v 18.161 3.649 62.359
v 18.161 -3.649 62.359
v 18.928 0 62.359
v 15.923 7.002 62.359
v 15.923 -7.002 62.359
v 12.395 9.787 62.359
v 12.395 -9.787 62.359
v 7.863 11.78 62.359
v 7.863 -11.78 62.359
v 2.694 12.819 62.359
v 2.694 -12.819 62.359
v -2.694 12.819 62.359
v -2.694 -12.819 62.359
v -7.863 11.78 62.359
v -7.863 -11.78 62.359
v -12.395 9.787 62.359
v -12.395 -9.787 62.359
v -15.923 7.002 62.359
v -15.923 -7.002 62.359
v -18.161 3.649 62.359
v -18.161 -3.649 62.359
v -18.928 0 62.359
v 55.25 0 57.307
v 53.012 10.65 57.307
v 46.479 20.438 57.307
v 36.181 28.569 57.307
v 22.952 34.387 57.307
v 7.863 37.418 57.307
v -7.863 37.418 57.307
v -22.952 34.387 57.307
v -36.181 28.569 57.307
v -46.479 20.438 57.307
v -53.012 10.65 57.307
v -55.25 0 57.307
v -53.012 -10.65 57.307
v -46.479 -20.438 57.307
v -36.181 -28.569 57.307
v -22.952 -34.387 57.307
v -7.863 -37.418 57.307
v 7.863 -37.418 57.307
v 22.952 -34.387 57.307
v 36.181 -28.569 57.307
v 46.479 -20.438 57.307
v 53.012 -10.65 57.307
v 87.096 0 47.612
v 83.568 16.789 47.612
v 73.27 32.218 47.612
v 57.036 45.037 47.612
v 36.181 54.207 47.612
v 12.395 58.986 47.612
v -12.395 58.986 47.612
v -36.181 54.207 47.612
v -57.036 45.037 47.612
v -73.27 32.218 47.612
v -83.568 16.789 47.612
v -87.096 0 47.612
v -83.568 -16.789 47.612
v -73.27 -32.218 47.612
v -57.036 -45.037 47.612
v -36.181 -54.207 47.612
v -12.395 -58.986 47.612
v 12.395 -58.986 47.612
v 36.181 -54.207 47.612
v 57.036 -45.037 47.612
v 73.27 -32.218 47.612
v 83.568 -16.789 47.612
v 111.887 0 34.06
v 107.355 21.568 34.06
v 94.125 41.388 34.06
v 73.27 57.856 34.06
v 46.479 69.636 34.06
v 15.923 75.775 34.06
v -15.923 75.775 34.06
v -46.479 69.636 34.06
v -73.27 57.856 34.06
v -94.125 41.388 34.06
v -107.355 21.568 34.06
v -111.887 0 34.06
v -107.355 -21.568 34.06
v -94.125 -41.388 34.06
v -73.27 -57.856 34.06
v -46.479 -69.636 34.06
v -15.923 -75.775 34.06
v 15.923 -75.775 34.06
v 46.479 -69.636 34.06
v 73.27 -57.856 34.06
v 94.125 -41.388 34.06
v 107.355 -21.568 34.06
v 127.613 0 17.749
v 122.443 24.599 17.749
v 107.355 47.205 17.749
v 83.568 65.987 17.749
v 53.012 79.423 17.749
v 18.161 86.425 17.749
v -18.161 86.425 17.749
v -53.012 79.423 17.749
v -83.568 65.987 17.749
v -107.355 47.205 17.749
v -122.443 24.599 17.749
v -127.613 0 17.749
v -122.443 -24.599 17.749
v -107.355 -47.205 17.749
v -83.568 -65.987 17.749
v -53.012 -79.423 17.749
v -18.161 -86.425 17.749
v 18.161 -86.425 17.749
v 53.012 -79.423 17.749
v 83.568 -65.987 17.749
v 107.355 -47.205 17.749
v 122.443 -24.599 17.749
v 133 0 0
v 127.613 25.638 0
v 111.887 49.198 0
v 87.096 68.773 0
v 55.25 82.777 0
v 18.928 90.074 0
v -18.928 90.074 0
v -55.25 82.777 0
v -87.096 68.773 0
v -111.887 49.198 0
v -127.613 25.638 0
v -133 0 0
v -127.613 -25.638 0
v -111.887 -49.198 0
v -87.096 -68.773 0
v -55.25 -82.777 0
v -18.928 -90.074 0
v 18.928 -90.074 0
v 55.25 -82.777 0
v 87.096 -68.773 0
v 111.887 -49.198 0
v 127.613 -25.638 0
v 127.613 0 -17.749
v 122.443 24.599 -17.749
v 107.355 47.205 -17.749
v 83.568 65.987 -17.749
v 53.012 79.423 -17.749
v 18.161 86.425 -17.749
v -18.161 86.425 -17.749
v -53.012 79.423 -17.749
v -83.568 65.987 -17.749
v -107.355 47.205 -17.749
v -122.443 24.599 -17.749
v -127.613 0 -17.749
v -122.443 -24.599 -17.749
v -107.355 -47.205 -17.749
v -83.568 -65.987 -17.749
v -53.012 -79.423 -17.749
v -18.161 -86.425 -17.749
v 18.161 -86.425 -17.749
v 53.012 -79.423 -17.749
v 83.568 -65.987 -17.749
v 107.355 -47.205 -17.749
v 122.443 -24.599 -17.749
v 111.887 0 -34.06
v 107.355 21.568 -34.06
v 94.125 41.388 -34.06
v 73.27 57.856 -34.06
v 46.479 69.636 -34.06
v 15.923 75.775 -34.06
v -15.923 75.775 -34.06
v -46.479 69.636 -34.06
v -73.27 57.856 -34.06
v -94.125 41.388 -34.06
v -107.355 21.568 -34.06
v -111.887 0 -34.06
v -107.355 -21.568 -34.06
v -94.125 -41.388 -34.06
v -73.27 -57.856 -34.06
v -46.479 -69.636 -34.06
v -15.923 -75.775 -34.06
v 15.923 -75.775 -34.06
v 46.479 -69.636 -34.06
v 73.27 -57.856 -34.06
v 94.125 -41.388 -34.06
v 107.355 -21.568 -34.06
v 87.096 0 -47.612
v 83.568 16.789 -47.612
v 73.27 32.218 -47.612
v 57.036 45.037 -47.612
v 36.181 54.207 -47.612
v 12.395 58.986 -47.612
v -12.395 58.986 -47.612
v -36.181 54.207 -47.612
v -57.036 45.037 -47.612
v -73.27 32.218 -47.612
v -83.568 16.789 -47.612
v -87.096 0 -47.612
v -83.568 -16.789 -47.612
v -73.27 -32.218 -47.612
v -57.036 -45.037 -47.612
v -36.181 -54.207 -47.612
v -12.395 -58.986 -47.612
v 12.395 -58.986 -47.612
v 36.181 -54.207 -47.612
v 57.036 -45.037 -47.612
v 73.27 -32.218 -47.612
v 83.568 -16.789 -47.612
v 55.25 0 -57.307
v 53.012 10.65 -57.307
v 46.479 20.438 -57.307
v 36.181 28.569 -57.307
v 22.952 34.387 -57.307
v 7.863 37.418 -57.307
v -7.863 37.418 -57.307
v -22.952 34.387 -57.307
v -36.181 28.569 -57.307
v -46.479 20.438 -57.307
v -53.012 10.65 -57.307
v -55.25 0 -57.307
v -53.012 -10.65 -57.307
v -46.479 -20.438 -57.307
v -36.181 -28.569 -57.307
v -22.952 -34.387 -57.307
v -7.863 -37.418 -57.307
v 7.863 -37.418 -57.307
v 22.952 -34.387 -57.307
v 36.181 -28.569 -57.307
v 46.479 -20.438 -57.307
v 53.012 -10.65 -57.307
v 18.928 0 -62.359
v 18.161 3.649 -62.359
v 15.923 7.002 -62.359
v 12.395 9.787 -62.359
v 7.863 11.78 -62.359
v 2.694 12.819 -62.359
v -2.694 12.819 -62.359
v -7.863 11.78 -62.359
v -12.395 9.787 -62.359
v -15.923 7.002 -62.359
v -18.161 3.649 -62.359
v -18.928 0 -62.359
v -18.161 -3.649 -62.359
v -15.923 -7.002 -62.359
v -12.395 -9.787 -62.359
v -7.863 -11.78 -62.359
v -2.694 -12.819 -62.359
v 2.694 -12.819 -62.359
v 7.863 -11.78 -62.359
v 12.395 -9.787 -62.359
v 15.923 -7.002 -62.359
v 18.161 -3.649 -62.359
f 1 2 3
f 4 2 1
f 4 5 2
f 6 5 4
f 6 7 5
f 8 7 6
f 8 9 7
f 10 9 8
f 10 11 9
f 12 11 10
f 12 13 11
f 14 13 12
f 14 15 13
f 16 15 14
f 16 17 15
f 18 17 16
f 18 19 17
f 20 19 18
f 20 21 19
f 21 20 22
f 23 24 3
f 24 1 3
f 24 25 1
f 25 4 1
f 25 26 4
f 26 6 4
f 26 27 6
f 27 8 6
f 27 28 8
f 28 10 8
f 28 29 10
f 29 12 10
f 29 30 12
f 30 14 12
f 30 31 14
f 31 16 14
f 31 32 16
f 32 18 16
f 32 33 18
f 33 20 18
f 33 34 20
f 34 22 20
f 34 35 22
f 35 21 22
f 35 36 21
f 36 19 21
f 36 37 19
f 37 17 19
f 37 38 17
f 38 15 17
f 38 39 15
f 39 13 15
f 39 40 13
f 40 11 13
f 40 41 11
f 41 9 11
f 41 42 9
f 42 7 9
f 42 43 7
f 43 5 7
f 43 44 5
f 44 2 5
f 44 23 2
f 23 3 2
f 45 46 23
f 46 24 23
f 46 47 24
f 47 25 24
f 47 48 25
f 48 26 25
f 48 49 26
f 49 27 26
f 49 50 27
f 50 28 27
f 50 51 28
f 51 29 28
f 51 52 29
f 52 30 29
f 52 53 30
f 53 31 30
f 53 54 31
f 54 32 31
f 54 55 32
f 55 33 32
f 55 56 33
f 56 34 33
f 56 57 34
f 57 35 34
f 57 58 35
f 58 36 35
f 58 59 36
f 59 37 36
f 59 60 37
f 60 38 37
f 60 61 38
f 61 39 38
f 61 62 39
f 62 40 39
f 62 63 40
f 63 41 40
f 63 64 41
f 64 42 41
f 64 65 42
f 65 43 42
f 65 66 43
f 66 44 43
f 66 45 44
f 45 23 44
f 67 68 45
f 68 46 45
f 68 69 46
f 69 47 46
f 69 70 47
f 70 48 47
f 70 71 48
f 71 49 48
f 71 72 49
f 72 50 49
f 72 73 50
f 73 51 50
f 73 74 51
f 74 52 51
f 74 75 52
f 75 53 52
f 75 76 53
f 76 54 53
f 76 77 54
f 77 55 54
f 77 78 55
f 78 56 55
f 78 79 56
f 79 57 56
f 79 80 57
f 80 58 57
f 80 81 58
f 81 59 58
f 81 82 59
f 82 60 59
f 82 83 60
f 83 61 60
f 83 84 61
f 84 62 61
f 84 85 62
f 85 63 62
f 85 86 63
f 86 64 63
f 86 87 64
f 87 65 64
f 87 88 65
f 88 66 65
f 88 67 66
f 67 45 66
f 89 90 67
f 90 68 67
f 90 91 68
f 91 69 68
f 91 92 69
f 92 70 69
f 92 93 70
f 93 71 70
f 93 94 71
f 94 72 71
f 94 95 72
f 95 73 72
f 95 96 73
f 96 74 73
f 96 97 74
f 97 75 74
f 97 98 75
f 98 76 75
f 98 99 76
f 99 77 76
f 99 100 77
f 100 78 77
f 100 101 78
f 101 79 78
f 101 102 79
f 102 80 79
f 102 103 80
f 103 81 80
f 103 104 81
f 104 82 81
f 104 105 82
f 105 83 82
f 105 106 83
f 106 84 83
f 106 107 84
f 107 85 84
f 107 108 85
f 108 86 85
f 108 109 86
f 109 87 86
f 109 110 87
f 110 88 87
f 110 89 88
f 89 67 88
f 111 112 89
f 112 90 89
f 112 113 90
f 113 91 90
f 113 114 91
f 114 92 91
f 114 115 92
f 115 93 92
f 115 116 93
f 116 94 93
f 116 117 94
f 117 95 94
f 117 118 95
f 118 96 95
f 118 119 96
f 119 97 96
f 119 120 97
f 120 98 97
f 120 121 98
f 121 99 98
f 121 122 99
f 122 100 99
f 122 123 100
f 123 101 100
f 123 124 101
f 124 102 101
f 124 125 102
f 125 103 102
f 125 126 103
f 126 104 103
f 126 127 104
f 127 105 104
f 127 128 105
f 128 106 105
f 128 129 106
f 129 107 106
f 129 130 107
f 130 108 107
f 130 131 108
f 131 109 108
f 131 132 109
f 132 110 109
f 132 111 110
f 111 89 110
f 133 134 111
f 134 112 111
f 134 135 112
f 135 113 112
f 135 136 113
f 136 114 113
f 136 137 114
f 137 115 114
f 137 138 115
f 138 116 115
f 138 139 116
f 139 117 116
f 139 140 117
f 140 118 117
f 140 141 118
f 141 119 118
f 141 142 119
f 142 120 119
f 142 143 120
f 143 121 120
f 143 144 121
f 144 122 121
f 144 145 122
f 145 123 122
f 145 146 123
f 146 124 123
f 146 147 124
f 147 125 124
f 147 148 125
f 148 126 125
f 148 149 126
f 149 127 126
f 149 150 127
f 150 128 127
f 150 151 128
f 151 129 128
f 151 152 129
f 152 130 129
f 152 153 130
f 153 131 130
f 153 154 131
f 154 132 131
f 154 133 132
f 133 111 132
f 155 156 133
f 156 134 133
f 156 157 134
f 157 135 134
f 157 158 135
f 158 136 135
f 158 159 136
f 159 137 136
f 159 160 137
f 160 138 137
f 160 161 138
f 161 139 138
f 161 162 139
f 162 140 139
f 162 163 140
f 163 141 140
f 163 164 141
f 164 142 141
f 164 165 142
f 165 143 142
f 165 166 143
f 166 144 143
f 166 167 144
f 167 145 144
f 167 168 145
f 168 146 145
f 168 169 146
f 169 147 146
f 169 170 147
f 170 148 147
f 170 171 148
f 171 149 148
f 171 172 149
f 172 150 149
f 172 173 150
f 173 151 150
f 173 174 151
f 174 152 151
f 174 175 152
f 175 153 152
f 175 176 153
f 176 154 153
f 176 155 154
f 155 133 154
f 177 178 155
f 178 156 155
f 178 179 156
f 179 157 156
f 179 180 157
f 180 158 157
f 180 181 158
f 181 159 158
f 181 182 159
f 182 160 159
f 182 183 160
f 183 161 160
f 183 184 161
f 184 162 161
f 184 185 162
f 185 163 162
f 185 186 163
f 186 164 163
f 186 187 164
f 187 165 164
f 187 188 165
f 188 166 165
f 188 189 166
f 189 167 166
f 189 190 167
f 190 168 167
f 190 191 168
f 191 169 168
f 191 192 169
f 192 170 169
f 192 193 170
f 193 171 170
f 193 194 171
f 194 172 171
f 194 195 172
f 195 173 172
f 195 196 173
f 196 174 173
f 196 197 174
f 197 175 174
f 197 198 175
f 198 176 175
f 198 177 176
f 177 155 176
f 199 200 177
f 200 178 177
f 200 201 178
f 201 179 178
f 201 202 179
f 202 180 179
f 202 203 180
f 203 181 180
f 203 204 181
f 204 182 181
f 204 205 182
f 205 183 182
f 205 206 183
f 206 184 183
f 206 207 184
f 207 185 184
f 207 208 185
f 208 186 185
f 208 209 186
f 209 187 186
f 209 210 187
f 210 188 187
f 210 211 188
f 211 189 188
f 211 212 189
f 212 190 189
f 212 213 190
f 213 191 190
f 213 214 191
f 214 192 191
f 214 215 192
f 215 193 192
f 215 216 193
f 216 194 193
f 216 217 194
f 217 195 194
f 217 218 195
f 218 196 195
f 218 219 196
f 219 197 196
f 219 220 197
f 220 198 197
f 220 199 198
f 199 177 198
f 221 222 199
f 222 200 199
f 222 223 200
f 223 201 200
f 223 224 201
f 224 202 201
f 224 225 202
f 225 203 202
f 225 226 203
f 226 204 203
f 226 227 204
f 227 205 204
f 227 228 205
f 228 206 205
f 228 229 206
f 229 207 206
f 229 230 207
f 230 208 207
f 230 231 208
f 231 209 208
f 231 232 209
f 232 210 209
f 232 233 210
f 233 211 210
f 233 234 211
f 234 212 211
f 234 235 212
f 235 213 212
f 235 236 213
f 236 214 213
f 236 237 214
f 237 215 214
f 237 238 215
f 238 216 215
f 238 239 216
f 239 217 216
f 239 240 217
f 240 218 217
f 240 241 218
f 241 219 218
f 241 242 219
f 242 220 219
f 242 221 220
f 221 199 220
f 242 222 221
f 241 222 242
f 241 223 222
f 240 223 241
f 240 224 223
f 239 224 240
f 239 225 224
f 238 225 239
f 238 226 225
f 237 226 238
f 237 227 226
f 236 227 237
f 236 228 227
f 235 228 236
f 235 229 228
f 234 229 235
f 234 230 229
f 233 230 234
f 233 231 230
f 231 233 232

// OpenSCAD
// Generated by SolidPython 1.0.1 on 2020-07-29 00:46:54


scale(v = [19, 13, 9]) {
	sphere(r = 7);
}
/***********************************************
*********      SolidPython code:      **********
************************************************
 
# import packages: SolidPython
from solid import *
from solid.utils import *
from itertools import chain, combinations, permutations


class Resize:

    def __init__(self, scad_file):
        self.scad_file = scad_file
        #self.scad_file = import_scad(scad_file)
        # cone/cylinder param:
        self.r1 = 0
        self.r2 = 0
        self.h = 0
        # rectangular prism param:
        self.w = 0
        self.l = 0
        # ellipse param:
        self.r = 0

    # import OpenScad code (file name corresponds to shape)


    # classify shape + parameters
    def assign(self, param1, param2, param3):
        if self.scad_file == 'cone.scad':
            self.r1 = param1
            self.r2 = param2
            self.h = param3
        elif self.scad_file == 'cylinder.scad':
            self.r1 = param1
            self.r2 = param2
            self.h = param3
        elif self.scad_file == 'rectangularPrism.scad':
            self.h = param1
            self.l = param2
            self.w = param3
        else:
            self.r = param1
            self.h = param2

    # resize parameters
    def iterate(self):
        x = range(3, 20, 2)
        i = 1
        if self.scad_file == 'cone.scad':
            tempList = list(permutations(x, 2))
            for temp in tempList:
                param1 = temp[0]
                param2 = temp[1]
                filepath = 'produced_scad_files/' + 'cone' + str(param1) + '_' + str(param2) + '_' + '.scad'
                scad_render_to_file(cylinder(h=param1, r1=param2, r2=0), filepath)

        elif self.scad_file == 'cylinder.scad':
            tempList = list(permutations(x, 3))
            for temp in tempList:
                param1 = temp[0]
                param2 = temp[1]
                filepath = 'produced_scad_files/' + 'cylinder' + str(param1) + '_' + str(param2) + '_' + '.scad'
                scad_render_to_file(cylinder(h=param1, r1=param2, r2=param2), filepath)

        elif self.scad_file == 'rectangularPrism.scad':
            tempList = list(permutations(x, 3))
            for temp in tempList:
                param1 = temp[0]
                param2 = temp[1]
                param3 = temp[2]
                filepath = 'produced_scad_files/' + 'rectangularPrism' + str(param1) + '_' + str(param2) + '_' + str(
                    param3) + '.scad'
                scad_render_to_file(cube(size=(param1, param2, param3)), filepath)

        elif self.scad_file == 'ellipse.scad':
            tempList = list(permutations(x, 4))
            for temp in tempList:
                param1 = temp[0]
                param2 = temp[1]
                param3 = temp[2]
                param4 = temp[3]
                filepath = 'produced_scad_files/' + 'ellipse' + str(param1) + '_' + str(param2) + '_' + str(param3) + '_' + str(param4) + '.scad'
                scad_render_to_file(scale([param1, param2, param3])(sphere(r=param4)), filepath)

    def render_to_scadfile(self):
        scad_render_to_file(scad, 'example.scad') 
 
************************************************/
